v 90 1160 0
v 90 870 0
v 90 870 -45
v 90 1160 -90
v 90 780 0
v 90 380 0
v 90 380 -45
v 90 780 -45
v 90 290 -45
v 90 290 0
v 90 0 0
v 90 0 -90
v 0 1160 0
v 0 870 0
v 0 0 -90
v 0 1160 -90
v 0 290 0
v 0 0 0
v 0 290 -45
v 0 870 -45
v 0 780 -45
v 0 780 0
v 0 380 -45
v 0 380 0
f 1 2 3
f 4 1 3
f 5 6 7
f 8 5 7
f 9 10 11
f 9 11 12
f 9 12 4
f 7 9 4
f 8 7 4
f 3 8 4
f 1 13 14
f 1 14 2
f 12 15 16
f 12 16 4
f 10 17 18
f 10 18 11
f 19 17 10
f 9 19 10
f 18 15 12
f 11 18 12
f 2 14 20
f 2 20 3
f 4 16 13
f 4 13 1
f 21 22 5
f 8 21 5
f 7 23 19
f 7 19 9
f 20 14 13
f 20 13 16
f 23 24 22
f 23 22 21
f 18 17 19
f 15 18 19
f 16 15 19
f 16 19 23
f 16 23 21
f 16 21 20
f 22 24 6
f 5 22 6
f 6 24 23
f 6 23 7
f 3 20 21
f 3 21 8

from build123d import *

# Parameters (mm, degrees)
SKETCH1_W           = 90
SKETCH1_H           = 90
BOSS_EXTRUDE1_DEPTH = 1160
SKETCH3_W           = 90
SKETCH3_H           = 90
CUT_EXTRUDE1_DEPTH  = 45
SKETCH4_W           = 90
SKETCH4_H           = 90
CUT_EXTRUDE2_DEPTH  = 45


with BuildPart() as part:
    # Sketch1 → Boss-Extrude1 (new body)
    with BuildSketch(Plane(origin=(0, 0, 0), x_dir=(1, 0, 0), z_dir=(0, 1, 0))):
        with Locations((45, 45)):
            Rectangle(SKETCH1_W, SKETCH1_H)
    extrude(amount=BOSS_EXTRUDE1_DEPTH)

    # Sketch3 → Cut-Extrude1 (cut)
    with BuildSketch(Plane.XY):
        with Locations((45, 825)):
            Rectangle(SKETCH3_W, SKETCH3_H)
    extrude(amount=-CUT_EXTRUDE1_DEPTH, mode=Mode.SUBTRACT)

    # Sketch4 → Cut-Extrude2 (cut)
    with BuildSketch(Plane.XY):
        with Locations((45, 335)):
            Rectangle(SKETCH4_W, SKETCH4_H)
    extrude(amount=-CUT_EXTRUDE2_DEPTH, mode=Mode.SUBTRACT)


solid = part.part
